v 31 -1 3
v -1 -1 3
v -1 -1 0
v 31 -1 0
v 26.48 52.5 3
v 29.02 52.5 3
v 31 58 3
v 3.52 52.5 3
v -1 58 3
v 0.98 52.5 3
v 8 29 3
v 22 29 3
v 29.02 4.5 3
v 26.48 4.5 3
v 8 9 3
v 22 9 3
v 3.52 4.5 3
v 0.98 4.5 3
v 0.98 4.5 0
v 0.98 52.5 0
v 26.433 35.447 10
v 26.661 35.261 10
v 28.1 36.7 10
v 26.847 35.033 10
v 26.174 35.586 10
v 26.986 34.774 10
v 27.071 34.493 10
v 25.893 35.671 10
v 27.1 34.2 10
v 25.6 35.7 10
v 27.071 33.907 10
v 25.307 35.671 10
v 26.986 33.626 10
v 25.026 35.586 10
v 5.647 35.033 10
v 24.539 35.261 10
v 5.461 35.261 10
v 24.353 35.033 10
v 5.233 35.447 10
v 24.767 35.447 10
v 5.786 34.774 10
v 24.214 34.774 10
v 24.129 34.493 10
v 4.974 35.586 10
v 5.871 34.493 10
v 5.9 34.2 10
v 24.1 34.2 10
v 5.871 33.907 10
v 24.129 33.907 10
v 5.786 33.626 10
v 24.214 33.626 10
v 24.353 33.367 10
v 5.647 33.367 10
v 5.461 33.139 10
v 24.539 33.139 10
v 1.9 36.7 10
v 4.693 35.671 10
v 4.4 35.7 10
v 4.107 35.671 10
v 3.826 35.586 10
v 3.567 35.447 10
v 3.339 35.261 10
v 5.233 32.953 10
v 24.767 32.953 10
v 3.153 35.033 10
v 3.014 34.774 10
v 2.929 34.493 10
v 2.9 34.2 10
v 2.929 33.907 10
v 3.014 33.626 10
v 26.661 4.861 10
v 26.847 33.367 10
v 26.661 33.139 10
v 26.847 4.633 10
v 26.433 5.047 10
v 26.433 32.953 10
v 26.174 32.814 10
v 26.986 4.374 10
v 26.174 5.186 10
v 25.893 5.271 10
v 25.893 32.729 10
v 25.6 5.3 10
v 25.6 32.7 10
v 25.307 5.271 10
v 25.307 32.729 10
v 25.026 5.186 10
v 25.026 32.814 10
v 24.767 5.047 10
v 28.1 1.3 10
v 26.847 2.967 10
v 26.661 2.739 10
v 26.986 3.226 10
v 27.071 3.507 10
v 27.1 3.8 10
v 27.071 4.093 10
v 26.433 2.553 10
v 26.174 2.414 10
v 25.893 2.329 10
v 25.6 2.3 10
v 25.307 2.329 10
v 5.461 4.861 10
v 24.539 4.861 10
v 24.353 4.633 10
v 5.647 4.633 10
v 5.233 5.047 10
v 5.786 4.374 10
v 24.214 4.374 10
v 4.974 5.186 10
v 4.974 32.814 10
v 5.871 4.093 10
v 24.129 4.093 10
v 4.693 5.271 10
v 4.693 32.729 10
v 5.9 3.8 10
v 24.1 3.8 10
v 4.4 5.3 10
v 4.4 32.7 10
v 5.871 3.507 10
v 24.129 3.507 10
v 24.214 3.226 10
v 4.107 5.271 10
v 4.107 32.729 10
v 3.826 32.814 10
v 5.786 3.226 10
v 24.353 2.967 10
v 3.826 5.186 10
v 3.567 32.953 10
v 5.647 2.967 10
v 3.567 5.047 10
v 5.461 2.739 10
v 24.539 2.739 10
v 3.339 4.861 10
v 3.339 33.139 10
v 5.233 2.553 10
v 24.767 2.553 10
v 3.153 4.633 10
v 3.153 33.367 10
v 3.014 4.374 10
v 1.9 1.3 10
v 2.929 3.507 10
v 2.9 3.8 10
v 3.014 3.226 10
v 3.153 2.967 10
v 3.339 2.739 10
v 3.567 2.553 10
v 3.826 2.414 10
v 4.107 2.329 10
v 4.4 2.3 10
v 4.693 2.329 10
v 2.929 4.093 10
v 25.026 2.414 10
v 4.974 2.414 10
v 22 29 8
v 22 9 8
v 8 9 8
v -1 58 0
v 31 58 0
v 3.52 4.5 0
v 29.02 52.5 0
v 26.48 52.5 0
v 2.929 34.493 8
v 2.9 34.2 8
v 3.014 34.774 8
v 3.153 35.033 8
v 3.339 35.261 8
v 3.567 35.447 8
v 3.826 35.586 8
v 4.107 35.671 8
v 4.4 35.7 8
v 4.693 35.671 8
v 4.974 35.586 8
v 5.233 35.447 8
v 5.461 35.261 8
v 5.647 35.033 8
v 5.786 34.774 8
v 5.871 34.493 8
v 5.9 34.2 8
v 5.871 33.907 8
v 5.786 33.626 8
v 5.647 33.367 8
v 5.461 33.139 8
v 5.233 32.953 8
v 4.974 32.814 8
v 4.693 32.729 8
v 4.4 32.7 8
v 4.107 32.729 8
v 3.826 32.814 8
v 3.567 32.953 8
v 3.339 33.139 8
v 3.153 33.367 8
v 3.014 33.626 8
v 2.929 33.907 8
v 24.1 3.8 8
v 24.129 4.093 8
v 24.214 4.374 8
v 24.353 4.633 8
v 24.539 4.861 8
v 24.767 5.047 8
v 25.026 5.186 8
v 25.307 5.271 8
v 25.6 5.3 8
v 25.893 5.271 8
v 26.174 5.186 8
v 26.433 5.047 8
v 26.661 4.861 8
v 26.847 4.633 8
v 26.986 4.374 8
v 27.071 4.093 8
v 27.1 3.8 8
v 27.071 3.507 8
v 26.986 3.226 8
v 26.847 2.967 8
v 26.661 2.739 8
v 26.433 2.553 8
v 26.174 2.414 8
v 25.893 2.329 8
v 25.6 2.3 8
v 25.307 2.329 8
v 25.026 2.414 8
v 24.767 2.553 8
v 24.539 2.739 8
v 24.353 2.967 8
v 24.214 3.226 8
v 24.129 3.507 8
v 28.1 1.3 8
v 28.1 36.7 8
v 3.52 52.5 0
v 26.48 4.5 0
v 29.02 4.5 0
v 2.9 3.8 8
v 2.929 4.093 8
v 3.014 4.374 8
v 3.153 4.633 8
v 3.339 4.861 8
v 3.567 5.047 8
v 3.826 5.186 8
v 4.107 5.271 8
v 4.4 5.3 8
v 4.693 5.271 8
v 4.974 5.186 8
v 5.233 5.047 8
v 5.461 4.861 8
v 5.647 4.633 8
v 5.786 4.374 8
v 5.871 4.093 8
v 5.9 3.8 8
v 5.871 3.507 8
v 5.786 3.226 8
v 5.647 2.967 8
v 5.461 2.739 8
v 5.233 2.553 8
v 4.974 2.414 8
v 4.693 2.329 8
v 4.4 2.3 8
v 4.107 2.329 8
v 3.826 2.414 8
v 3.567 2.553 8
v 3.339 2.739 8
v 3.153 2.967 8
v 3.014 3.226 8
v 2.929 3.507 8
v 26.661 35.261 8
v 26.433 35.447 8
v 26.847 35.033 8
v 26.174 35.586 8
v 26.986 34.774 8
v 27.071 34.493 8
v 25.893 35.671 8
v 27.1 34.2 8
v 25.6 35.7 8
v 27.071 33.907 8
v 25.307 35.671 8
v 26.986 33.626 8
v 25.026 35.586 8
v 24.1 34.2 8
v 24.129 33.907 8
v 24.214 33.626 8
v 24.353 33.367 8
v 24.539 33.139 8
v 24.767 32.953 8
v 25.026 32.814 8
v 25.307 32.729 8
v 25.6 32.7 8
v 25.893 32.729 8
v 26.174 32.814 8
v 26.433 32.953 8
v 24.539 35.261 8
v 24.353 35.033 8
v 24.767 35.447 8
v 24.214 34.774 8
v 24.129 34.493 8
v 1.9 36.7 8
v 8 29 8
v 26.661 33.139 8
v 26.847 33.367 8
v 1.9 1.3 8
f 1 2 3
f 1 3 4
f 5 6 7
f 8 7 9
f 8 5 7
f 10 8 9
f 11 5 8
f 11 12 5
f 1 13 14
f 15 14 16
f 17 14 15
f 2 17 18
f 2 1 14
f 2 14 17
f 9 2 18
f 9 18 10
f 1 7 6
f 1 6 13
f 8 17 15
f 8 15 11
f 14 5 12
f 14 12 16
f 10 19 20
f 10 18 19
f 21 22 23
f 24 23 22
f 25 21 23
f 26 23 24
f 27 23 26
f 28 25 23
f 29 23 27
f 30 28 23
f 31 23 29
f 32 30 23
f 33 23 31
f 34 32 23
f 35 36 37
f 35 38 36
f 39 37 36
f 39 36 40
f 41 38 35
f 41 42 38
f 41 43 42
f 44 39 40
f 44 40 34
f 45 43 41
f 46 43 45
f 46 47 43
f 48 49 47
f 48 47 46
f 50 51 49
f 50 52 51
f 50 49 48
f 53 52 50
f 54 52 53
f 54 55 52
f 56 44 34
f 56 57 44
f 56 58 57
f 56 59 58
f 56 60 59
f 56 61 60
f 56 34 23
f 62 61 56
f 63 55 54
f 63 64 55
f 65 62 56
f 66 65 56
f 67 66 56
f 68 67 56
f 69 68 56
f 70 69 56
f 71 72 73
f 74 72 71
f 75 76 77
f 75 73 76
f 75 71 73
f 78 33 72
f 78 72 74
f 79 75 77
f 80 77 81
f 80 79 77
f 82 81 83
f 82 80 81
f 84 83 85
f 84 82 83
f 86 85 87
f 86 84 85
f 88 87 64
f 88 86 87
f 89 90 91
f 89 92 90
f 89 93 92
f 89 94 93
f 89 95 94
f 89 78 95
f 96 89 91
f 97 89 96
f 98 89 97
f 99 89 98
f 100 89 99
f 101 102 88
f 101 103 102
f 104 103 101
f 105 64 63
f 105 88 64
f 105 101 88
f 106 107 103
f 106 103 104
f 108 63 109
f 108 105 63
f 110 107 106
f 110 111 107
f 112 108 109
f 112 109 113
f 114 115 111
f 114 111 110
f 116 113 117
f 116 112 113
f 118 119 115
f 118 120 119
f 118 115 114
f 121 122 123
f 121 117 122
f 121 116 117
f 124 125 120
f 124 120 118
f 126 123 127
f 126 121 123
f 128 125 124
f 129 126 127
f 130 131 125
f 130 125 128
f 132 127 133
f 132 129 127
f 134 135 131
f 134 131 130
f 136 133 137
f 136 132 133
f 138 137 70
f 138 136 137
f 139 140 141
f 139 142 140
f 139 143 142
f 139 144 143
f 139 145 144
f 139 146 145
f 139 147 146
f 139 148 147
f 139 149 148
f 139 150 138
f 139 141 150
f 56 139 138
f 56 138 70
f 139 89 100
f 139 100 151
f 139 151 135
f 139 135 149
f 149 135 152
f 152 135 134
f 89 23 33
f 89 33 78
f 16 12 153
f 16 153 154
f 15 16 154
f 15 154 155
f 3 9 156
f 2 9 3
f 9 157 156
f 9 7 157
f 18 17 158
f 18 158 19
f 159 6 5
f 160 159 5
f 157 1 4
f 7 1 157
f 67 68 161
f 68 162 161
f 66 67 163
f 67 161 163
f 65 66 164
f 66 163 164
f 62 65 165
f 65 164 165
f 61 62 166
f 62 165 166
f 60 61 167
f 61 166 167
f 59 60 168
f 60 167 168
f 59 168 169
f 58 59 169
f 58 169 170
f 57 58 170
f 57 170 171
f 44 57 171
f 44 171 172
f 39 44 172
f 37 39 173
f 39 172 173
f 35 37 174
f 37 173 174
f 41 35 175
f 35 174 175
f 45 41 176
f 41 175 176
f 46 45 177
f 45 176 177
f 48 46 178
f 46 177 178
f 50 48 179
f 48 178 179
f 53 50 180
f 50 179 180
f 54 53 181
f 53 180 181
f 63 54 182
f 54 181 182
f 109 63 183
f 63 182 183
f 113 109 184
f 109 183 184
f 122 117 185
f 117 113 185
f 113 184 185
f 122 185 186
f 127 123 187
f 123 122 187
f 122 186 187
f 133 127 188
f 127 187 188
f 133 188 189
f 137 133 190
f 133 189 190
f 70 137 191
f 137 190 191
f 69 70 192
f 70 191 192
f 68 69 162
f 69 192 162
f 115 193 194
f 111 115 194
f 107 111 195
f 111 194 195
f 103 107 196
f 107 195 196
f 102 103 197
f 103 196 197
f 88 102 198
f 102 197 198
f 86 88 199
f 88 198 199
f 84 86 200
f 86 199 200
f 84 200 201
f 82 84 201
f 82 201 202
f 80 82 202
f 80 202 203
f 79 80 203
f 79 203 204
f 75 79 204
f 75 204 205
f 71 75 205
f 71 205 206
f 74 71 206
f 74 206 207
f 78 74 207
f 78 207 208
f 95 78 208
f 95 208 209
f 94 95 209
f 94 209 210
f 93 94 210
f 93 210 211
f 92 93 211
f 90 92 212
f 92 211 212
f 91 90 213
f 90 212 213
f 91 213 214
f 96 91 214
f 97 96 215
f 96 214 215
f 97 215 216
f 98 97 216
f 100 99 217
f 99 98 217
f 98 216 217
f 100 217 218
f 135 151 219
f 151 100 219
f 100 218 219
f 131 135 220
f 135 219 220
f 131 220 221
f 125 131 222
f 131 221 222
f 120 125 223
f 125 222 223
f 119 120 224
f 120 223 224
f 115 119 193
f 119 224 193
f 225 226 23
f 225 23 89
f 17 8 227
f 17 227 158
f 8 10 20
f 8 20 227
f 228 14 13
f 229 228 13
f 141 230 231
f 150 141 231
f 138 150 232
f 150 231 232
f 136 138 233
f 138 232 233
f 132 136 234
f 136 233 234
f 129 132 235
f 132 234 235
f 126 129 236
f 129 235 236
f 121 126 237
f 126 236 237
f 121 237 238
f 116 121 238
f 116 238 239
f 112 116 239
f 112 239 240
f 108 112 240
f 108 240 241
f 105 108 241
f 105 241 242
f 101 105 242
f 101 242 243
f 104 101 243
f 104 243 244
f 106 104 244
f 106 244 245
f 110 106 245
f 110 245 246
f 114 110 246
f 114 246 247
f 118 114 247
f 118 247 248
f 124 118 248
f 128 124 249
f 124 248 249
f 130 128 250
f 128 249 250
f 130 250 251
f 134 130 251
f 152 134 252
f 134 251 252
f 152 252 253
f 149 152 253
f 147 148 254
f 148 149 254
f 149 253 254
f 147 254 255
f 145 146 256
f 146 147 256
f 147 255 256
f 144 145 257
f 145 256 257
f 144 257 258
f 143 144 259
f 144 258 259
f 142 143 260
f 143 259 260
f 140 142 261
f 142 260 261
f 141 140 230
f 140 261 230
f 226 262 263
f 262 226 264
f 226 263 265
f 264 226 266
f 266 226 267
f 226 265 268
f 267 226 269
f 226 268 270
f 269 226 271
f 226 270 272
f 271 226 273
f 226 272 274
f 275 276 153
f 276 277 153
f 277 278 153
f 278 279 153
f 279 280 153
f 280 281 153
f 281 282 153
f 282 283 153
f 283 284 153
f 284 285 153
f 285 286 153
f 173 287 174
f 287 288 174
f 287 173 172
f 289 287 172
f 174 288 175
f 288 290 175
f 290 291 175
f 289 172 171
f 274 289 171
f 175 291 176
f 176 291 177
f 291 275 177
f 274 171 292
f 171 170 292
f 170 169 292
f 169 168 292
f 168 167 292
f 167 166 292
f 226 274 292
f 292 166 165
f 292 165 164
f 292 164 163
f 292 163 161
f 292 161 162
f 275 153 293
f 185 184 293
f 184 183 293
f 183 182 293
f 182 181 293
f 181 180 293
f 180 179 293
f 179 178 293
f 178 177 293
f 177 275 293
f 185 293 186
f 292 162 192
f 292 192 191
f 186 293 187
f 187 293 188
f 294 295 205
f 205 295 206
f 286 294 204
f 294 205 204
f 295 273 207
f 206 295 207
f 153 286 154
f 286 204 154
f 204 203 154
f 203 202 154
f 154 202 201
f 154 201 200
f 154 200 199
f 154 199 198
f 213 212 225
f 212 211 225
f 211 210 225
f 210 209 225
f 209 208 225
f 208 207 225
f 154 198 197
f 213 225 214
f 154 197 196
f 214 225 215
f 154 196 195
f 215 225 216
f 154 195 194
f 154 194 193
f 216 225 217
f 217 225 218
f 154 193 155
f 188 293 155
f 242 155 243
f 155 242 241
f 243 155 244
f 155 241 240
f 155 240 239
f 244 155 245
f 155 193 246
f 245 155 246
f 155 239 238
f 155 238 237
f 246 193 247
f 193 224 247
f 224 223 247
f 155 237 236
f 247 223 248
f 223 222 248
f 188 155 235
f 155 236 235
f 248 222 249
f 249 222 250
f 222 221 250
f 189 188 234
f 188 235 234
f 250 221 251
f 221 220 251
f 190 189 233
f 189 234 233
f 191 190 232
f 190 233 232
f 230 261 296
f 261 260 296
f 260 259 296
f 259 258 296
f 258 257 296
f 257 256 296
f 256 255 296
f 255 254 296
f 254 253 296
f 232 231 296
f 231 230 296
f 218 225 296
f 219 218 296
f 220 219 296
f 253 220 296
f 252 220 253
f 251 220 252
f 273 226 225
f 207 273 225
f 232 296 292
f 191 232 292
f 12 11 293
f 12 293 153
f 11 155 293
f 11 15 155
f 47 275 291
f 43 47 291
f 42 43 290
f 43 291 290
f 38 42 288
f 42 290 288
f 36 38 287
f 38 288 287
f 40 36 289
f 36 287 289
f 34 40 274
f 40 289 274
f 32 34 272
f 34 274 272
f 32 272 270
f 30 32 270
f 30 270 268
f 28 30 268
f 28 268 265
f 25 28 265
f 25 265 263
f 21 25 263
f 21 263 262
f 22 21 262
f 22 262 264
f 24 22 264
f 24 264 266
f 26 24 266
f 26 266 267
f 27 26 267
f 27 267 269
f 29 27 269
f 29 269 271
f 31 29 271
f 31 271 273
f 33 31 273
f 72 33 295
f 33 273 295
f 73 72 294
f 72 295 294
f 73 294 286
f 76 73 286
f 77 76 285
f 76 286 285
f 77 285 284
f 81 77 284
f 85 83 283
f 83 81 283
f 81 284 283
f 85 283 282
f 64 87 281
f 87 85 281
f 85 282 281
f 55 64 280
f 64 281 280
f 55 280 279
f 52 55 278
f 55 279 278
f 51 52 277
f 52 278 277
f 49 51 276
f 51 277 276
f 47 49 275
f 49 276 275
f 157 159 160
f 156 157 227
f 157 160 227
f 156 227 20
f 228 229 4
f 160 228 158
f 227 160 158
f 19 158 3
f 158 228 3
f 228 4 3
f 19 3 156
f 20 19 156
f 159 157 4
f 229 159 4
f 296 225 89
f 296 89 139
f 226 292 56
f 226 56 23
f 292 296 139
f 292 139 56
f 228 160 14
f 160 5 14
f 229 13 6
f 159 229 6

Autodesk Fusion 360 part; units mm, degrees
sketch "Boceto1" plane through (0, 0, 0) normal (0, 0, 1) x (1, 0, 0)
  line L0 (0, 0) -> (30, 0)
  line L1 (30, 0) -> (30, 57)
  line L2 (30, 57) -> (0, 57)
  line L3 (0, 57) -> (0, 0)
  dimension "d1" = 57
  dimension "d2" = 30
extrude "Extruir1" add sketch "Boceto1" along normal blind 3
sketch "Boceto2" plane through (0, 0, 3) normal (0, 0, 1) x (-1, 0, 0)
  line L0 (0, -57) -> (0, 0)
  line L1 (0, 0) -> (-30, 0)
  line L2 (-30, 0) -> (-30, -57)
  line L3 (-30, -57) -> (0, -57)
  line L4 (-0.98, -52.5) -> (-3.52, -52.5)
  line L5 (-3.52, -52.5) -> (-3.52, -4.5)
  line L6 (-3.52, -4.5) -> (-0.98, -4.5)
  line L7 (-0.98, -4.5) -> (-0.98, -52.5)
  line L8 (-15, -57) -> (-15, 0) construction
  line L9 (-26.48, -52.5) -> (-26.48, -4.5)
  line L10 (-29.02, -4.5) -> (-29.02, -52.5)
  line L11 (-29.02, -52.5) -> (-26.48, -52.5)
  line L12 (-26.48, -4.5) -> (-29.02, -4.5)
  point P0 (-0.98, -28.5)
  point P1 (0, -28.5)
  point P2 (-2.25, -52.5)
  point P3 (-27.75, -52.5)
  dimension "d5" = 2.54
  dimension "d6" = 48
  dimension "d7" = 25.5
extrude "Extruir2" cut sketch "Boceto2" against normal through all contours L4 L5 L6 L7 | L9 L10 L11 L12
sketch "Boceto3" plane through (0, 0, 3) normal (0, 0, 1) x (-1, 0, 0)
  line L0 (-0.98, -4.5) -> (-0.98, -52.5)
  line L1 (-0.98, -52.5) -> (-3.52, -52.5)
  line L2 (-3.52, -52.5) -> (-3.52, -4.5)
  line L3 (-3.52, -4.5) -> (-0.98, -4.5)
  line L4 (-26.48, -4.5) -> (-26.48, -52.5)
  line L5 (-26.48, -52.5) -> (-29.02, -52.5)
  line L6 (-29.02, -52.5) -> (-29.02, -4.5)
  line L7 (-29.02, -4.5) -> (-26.48, -4.5)
  line L8 (0, -57) -> (0, 0)
  line L9 (0, 0) -> (-30, 0)
  line L10 (-30, 0) -> (-30, -57)
  line L11 (-30, -57) -> (0, -57)
  line L12 (1, -58) -> (1, 1)
  line L13 (1, 1) -> (-31, 1)
  line L14 (-31, 1) -> (-31, -58)
  line L15 (-31, -58) -> (1, -58)
  dimension "d9" = 1
extrude "Extruir3" add sketch "Boceto3" against normal up to surface (3 mm away) contours L12 L13 L14 L15
sketch "Boceto4" plane through (0, 0, 3) normal (0, 0, 1) x (-1, 0, 0)
  line L0 (-31, -58) -> (1, -58)
  line L1 (1, -58) -> (1, 1)
  line L2 (1, 1) -> (-31, 1)
  line L3 (-31, 1) -> (-31, -58)
  line L4 (-0.98, -4.5) -> (-0.98, -52.5)
  line L5 (-0.98, -52.5) -> (-3.52, -52.5)
  line L6 (-3.52, -52.5) -> (-3.52, -4.5)
  line L7 (-3.52, -4.5) -> (-0.98, -4.5)
  line L8 (-26.48, -4.5) -> (-26.48, -52.5)
  line L9 (-26.48, -52.5) -> (-29.02, -52.5)
  line L10 (-29.02, -52.5) -> (-29.02, -4.5)
  line L11 (-29.02, -4.5) -> (-26.48, -4.5)
  line L12 (-22, -9) -> (-8, -9)
  line L13 (-8, -9) -> (-8, -29)
  line L14 (-8, -29) -> (-22, -29)
  line L15 (-22, -29) -> (-22, -9)
  point P0 (-15, -9)
  point P1 (-15, 1)
  dimension "d12" = 10
  dimension "d13" = 20
  dimension "d14" = 14
extrude "Extruir4" add sketch "Boceto4" along normal blind 5 contours L12 L13 L14 L15
sketch "Boceto5" plane through (0, 0, 8) normal (0, 0, 1) x (-1, 0, 0)
  line L0 (-22, -29) -> (-8, -29)
  line L1 (-8, -29) -> (-8, -9)
  line L2 (-8, -9) -> (-22, -9)
  line L3 (-22, -9) -> (-22, -29)
  line L4 (-28.1, -1.3) -> (-1.9, -1.3)
  line L5 (-1.9, -1.3) -> (-1.9, -36.7)
  line L6 (-1.9, -36.7) -> (-28.1, -36.7)
  line L7 (-28.1, -36.7) -> (-28.1, -1.3)
  line L8 (-25.6, -3.8) -> (-4.4, -3.8)
  line L9 (-4.4, -3.8) -> (-4.4, -34.2)
  line L10 (-4.4, -34.2) -> (-25.6, -34.2)
  line L11 (-25.6, -34.2) -> (-25.6, -3.8)
  circle A0 centre (-25.6, -3.8) radius 1.5
  circle A1 centre (-4.4, -3.8) radius 1.5
  circle A2 centre (-25.6, -34.2) radius 1.5
  circle A3 centre (-4.4, -34.2) radius 1.5
  point P0 (-15, -1.3)
  point P1 (-15, -9)
  point P2 (-1.9, -19)
  point P3 (-8, -19)
  point P4 (-15, -3.8)
  point P5 (-4.4, -19)
  dimension "d17" = 26.2
  dimension "d18" = 35.4
  dimension "d21" = 3
  dimension "d22" = 21.2
  dimension "d23" = 30.4
extrude "Extruir5" add sketch "Boceto5" along normal blind 2 contours L0 L1 L2 L3 | L4 L5 L6 L7 | L8 L9 L10 L11 A0 A1 A2 A3
